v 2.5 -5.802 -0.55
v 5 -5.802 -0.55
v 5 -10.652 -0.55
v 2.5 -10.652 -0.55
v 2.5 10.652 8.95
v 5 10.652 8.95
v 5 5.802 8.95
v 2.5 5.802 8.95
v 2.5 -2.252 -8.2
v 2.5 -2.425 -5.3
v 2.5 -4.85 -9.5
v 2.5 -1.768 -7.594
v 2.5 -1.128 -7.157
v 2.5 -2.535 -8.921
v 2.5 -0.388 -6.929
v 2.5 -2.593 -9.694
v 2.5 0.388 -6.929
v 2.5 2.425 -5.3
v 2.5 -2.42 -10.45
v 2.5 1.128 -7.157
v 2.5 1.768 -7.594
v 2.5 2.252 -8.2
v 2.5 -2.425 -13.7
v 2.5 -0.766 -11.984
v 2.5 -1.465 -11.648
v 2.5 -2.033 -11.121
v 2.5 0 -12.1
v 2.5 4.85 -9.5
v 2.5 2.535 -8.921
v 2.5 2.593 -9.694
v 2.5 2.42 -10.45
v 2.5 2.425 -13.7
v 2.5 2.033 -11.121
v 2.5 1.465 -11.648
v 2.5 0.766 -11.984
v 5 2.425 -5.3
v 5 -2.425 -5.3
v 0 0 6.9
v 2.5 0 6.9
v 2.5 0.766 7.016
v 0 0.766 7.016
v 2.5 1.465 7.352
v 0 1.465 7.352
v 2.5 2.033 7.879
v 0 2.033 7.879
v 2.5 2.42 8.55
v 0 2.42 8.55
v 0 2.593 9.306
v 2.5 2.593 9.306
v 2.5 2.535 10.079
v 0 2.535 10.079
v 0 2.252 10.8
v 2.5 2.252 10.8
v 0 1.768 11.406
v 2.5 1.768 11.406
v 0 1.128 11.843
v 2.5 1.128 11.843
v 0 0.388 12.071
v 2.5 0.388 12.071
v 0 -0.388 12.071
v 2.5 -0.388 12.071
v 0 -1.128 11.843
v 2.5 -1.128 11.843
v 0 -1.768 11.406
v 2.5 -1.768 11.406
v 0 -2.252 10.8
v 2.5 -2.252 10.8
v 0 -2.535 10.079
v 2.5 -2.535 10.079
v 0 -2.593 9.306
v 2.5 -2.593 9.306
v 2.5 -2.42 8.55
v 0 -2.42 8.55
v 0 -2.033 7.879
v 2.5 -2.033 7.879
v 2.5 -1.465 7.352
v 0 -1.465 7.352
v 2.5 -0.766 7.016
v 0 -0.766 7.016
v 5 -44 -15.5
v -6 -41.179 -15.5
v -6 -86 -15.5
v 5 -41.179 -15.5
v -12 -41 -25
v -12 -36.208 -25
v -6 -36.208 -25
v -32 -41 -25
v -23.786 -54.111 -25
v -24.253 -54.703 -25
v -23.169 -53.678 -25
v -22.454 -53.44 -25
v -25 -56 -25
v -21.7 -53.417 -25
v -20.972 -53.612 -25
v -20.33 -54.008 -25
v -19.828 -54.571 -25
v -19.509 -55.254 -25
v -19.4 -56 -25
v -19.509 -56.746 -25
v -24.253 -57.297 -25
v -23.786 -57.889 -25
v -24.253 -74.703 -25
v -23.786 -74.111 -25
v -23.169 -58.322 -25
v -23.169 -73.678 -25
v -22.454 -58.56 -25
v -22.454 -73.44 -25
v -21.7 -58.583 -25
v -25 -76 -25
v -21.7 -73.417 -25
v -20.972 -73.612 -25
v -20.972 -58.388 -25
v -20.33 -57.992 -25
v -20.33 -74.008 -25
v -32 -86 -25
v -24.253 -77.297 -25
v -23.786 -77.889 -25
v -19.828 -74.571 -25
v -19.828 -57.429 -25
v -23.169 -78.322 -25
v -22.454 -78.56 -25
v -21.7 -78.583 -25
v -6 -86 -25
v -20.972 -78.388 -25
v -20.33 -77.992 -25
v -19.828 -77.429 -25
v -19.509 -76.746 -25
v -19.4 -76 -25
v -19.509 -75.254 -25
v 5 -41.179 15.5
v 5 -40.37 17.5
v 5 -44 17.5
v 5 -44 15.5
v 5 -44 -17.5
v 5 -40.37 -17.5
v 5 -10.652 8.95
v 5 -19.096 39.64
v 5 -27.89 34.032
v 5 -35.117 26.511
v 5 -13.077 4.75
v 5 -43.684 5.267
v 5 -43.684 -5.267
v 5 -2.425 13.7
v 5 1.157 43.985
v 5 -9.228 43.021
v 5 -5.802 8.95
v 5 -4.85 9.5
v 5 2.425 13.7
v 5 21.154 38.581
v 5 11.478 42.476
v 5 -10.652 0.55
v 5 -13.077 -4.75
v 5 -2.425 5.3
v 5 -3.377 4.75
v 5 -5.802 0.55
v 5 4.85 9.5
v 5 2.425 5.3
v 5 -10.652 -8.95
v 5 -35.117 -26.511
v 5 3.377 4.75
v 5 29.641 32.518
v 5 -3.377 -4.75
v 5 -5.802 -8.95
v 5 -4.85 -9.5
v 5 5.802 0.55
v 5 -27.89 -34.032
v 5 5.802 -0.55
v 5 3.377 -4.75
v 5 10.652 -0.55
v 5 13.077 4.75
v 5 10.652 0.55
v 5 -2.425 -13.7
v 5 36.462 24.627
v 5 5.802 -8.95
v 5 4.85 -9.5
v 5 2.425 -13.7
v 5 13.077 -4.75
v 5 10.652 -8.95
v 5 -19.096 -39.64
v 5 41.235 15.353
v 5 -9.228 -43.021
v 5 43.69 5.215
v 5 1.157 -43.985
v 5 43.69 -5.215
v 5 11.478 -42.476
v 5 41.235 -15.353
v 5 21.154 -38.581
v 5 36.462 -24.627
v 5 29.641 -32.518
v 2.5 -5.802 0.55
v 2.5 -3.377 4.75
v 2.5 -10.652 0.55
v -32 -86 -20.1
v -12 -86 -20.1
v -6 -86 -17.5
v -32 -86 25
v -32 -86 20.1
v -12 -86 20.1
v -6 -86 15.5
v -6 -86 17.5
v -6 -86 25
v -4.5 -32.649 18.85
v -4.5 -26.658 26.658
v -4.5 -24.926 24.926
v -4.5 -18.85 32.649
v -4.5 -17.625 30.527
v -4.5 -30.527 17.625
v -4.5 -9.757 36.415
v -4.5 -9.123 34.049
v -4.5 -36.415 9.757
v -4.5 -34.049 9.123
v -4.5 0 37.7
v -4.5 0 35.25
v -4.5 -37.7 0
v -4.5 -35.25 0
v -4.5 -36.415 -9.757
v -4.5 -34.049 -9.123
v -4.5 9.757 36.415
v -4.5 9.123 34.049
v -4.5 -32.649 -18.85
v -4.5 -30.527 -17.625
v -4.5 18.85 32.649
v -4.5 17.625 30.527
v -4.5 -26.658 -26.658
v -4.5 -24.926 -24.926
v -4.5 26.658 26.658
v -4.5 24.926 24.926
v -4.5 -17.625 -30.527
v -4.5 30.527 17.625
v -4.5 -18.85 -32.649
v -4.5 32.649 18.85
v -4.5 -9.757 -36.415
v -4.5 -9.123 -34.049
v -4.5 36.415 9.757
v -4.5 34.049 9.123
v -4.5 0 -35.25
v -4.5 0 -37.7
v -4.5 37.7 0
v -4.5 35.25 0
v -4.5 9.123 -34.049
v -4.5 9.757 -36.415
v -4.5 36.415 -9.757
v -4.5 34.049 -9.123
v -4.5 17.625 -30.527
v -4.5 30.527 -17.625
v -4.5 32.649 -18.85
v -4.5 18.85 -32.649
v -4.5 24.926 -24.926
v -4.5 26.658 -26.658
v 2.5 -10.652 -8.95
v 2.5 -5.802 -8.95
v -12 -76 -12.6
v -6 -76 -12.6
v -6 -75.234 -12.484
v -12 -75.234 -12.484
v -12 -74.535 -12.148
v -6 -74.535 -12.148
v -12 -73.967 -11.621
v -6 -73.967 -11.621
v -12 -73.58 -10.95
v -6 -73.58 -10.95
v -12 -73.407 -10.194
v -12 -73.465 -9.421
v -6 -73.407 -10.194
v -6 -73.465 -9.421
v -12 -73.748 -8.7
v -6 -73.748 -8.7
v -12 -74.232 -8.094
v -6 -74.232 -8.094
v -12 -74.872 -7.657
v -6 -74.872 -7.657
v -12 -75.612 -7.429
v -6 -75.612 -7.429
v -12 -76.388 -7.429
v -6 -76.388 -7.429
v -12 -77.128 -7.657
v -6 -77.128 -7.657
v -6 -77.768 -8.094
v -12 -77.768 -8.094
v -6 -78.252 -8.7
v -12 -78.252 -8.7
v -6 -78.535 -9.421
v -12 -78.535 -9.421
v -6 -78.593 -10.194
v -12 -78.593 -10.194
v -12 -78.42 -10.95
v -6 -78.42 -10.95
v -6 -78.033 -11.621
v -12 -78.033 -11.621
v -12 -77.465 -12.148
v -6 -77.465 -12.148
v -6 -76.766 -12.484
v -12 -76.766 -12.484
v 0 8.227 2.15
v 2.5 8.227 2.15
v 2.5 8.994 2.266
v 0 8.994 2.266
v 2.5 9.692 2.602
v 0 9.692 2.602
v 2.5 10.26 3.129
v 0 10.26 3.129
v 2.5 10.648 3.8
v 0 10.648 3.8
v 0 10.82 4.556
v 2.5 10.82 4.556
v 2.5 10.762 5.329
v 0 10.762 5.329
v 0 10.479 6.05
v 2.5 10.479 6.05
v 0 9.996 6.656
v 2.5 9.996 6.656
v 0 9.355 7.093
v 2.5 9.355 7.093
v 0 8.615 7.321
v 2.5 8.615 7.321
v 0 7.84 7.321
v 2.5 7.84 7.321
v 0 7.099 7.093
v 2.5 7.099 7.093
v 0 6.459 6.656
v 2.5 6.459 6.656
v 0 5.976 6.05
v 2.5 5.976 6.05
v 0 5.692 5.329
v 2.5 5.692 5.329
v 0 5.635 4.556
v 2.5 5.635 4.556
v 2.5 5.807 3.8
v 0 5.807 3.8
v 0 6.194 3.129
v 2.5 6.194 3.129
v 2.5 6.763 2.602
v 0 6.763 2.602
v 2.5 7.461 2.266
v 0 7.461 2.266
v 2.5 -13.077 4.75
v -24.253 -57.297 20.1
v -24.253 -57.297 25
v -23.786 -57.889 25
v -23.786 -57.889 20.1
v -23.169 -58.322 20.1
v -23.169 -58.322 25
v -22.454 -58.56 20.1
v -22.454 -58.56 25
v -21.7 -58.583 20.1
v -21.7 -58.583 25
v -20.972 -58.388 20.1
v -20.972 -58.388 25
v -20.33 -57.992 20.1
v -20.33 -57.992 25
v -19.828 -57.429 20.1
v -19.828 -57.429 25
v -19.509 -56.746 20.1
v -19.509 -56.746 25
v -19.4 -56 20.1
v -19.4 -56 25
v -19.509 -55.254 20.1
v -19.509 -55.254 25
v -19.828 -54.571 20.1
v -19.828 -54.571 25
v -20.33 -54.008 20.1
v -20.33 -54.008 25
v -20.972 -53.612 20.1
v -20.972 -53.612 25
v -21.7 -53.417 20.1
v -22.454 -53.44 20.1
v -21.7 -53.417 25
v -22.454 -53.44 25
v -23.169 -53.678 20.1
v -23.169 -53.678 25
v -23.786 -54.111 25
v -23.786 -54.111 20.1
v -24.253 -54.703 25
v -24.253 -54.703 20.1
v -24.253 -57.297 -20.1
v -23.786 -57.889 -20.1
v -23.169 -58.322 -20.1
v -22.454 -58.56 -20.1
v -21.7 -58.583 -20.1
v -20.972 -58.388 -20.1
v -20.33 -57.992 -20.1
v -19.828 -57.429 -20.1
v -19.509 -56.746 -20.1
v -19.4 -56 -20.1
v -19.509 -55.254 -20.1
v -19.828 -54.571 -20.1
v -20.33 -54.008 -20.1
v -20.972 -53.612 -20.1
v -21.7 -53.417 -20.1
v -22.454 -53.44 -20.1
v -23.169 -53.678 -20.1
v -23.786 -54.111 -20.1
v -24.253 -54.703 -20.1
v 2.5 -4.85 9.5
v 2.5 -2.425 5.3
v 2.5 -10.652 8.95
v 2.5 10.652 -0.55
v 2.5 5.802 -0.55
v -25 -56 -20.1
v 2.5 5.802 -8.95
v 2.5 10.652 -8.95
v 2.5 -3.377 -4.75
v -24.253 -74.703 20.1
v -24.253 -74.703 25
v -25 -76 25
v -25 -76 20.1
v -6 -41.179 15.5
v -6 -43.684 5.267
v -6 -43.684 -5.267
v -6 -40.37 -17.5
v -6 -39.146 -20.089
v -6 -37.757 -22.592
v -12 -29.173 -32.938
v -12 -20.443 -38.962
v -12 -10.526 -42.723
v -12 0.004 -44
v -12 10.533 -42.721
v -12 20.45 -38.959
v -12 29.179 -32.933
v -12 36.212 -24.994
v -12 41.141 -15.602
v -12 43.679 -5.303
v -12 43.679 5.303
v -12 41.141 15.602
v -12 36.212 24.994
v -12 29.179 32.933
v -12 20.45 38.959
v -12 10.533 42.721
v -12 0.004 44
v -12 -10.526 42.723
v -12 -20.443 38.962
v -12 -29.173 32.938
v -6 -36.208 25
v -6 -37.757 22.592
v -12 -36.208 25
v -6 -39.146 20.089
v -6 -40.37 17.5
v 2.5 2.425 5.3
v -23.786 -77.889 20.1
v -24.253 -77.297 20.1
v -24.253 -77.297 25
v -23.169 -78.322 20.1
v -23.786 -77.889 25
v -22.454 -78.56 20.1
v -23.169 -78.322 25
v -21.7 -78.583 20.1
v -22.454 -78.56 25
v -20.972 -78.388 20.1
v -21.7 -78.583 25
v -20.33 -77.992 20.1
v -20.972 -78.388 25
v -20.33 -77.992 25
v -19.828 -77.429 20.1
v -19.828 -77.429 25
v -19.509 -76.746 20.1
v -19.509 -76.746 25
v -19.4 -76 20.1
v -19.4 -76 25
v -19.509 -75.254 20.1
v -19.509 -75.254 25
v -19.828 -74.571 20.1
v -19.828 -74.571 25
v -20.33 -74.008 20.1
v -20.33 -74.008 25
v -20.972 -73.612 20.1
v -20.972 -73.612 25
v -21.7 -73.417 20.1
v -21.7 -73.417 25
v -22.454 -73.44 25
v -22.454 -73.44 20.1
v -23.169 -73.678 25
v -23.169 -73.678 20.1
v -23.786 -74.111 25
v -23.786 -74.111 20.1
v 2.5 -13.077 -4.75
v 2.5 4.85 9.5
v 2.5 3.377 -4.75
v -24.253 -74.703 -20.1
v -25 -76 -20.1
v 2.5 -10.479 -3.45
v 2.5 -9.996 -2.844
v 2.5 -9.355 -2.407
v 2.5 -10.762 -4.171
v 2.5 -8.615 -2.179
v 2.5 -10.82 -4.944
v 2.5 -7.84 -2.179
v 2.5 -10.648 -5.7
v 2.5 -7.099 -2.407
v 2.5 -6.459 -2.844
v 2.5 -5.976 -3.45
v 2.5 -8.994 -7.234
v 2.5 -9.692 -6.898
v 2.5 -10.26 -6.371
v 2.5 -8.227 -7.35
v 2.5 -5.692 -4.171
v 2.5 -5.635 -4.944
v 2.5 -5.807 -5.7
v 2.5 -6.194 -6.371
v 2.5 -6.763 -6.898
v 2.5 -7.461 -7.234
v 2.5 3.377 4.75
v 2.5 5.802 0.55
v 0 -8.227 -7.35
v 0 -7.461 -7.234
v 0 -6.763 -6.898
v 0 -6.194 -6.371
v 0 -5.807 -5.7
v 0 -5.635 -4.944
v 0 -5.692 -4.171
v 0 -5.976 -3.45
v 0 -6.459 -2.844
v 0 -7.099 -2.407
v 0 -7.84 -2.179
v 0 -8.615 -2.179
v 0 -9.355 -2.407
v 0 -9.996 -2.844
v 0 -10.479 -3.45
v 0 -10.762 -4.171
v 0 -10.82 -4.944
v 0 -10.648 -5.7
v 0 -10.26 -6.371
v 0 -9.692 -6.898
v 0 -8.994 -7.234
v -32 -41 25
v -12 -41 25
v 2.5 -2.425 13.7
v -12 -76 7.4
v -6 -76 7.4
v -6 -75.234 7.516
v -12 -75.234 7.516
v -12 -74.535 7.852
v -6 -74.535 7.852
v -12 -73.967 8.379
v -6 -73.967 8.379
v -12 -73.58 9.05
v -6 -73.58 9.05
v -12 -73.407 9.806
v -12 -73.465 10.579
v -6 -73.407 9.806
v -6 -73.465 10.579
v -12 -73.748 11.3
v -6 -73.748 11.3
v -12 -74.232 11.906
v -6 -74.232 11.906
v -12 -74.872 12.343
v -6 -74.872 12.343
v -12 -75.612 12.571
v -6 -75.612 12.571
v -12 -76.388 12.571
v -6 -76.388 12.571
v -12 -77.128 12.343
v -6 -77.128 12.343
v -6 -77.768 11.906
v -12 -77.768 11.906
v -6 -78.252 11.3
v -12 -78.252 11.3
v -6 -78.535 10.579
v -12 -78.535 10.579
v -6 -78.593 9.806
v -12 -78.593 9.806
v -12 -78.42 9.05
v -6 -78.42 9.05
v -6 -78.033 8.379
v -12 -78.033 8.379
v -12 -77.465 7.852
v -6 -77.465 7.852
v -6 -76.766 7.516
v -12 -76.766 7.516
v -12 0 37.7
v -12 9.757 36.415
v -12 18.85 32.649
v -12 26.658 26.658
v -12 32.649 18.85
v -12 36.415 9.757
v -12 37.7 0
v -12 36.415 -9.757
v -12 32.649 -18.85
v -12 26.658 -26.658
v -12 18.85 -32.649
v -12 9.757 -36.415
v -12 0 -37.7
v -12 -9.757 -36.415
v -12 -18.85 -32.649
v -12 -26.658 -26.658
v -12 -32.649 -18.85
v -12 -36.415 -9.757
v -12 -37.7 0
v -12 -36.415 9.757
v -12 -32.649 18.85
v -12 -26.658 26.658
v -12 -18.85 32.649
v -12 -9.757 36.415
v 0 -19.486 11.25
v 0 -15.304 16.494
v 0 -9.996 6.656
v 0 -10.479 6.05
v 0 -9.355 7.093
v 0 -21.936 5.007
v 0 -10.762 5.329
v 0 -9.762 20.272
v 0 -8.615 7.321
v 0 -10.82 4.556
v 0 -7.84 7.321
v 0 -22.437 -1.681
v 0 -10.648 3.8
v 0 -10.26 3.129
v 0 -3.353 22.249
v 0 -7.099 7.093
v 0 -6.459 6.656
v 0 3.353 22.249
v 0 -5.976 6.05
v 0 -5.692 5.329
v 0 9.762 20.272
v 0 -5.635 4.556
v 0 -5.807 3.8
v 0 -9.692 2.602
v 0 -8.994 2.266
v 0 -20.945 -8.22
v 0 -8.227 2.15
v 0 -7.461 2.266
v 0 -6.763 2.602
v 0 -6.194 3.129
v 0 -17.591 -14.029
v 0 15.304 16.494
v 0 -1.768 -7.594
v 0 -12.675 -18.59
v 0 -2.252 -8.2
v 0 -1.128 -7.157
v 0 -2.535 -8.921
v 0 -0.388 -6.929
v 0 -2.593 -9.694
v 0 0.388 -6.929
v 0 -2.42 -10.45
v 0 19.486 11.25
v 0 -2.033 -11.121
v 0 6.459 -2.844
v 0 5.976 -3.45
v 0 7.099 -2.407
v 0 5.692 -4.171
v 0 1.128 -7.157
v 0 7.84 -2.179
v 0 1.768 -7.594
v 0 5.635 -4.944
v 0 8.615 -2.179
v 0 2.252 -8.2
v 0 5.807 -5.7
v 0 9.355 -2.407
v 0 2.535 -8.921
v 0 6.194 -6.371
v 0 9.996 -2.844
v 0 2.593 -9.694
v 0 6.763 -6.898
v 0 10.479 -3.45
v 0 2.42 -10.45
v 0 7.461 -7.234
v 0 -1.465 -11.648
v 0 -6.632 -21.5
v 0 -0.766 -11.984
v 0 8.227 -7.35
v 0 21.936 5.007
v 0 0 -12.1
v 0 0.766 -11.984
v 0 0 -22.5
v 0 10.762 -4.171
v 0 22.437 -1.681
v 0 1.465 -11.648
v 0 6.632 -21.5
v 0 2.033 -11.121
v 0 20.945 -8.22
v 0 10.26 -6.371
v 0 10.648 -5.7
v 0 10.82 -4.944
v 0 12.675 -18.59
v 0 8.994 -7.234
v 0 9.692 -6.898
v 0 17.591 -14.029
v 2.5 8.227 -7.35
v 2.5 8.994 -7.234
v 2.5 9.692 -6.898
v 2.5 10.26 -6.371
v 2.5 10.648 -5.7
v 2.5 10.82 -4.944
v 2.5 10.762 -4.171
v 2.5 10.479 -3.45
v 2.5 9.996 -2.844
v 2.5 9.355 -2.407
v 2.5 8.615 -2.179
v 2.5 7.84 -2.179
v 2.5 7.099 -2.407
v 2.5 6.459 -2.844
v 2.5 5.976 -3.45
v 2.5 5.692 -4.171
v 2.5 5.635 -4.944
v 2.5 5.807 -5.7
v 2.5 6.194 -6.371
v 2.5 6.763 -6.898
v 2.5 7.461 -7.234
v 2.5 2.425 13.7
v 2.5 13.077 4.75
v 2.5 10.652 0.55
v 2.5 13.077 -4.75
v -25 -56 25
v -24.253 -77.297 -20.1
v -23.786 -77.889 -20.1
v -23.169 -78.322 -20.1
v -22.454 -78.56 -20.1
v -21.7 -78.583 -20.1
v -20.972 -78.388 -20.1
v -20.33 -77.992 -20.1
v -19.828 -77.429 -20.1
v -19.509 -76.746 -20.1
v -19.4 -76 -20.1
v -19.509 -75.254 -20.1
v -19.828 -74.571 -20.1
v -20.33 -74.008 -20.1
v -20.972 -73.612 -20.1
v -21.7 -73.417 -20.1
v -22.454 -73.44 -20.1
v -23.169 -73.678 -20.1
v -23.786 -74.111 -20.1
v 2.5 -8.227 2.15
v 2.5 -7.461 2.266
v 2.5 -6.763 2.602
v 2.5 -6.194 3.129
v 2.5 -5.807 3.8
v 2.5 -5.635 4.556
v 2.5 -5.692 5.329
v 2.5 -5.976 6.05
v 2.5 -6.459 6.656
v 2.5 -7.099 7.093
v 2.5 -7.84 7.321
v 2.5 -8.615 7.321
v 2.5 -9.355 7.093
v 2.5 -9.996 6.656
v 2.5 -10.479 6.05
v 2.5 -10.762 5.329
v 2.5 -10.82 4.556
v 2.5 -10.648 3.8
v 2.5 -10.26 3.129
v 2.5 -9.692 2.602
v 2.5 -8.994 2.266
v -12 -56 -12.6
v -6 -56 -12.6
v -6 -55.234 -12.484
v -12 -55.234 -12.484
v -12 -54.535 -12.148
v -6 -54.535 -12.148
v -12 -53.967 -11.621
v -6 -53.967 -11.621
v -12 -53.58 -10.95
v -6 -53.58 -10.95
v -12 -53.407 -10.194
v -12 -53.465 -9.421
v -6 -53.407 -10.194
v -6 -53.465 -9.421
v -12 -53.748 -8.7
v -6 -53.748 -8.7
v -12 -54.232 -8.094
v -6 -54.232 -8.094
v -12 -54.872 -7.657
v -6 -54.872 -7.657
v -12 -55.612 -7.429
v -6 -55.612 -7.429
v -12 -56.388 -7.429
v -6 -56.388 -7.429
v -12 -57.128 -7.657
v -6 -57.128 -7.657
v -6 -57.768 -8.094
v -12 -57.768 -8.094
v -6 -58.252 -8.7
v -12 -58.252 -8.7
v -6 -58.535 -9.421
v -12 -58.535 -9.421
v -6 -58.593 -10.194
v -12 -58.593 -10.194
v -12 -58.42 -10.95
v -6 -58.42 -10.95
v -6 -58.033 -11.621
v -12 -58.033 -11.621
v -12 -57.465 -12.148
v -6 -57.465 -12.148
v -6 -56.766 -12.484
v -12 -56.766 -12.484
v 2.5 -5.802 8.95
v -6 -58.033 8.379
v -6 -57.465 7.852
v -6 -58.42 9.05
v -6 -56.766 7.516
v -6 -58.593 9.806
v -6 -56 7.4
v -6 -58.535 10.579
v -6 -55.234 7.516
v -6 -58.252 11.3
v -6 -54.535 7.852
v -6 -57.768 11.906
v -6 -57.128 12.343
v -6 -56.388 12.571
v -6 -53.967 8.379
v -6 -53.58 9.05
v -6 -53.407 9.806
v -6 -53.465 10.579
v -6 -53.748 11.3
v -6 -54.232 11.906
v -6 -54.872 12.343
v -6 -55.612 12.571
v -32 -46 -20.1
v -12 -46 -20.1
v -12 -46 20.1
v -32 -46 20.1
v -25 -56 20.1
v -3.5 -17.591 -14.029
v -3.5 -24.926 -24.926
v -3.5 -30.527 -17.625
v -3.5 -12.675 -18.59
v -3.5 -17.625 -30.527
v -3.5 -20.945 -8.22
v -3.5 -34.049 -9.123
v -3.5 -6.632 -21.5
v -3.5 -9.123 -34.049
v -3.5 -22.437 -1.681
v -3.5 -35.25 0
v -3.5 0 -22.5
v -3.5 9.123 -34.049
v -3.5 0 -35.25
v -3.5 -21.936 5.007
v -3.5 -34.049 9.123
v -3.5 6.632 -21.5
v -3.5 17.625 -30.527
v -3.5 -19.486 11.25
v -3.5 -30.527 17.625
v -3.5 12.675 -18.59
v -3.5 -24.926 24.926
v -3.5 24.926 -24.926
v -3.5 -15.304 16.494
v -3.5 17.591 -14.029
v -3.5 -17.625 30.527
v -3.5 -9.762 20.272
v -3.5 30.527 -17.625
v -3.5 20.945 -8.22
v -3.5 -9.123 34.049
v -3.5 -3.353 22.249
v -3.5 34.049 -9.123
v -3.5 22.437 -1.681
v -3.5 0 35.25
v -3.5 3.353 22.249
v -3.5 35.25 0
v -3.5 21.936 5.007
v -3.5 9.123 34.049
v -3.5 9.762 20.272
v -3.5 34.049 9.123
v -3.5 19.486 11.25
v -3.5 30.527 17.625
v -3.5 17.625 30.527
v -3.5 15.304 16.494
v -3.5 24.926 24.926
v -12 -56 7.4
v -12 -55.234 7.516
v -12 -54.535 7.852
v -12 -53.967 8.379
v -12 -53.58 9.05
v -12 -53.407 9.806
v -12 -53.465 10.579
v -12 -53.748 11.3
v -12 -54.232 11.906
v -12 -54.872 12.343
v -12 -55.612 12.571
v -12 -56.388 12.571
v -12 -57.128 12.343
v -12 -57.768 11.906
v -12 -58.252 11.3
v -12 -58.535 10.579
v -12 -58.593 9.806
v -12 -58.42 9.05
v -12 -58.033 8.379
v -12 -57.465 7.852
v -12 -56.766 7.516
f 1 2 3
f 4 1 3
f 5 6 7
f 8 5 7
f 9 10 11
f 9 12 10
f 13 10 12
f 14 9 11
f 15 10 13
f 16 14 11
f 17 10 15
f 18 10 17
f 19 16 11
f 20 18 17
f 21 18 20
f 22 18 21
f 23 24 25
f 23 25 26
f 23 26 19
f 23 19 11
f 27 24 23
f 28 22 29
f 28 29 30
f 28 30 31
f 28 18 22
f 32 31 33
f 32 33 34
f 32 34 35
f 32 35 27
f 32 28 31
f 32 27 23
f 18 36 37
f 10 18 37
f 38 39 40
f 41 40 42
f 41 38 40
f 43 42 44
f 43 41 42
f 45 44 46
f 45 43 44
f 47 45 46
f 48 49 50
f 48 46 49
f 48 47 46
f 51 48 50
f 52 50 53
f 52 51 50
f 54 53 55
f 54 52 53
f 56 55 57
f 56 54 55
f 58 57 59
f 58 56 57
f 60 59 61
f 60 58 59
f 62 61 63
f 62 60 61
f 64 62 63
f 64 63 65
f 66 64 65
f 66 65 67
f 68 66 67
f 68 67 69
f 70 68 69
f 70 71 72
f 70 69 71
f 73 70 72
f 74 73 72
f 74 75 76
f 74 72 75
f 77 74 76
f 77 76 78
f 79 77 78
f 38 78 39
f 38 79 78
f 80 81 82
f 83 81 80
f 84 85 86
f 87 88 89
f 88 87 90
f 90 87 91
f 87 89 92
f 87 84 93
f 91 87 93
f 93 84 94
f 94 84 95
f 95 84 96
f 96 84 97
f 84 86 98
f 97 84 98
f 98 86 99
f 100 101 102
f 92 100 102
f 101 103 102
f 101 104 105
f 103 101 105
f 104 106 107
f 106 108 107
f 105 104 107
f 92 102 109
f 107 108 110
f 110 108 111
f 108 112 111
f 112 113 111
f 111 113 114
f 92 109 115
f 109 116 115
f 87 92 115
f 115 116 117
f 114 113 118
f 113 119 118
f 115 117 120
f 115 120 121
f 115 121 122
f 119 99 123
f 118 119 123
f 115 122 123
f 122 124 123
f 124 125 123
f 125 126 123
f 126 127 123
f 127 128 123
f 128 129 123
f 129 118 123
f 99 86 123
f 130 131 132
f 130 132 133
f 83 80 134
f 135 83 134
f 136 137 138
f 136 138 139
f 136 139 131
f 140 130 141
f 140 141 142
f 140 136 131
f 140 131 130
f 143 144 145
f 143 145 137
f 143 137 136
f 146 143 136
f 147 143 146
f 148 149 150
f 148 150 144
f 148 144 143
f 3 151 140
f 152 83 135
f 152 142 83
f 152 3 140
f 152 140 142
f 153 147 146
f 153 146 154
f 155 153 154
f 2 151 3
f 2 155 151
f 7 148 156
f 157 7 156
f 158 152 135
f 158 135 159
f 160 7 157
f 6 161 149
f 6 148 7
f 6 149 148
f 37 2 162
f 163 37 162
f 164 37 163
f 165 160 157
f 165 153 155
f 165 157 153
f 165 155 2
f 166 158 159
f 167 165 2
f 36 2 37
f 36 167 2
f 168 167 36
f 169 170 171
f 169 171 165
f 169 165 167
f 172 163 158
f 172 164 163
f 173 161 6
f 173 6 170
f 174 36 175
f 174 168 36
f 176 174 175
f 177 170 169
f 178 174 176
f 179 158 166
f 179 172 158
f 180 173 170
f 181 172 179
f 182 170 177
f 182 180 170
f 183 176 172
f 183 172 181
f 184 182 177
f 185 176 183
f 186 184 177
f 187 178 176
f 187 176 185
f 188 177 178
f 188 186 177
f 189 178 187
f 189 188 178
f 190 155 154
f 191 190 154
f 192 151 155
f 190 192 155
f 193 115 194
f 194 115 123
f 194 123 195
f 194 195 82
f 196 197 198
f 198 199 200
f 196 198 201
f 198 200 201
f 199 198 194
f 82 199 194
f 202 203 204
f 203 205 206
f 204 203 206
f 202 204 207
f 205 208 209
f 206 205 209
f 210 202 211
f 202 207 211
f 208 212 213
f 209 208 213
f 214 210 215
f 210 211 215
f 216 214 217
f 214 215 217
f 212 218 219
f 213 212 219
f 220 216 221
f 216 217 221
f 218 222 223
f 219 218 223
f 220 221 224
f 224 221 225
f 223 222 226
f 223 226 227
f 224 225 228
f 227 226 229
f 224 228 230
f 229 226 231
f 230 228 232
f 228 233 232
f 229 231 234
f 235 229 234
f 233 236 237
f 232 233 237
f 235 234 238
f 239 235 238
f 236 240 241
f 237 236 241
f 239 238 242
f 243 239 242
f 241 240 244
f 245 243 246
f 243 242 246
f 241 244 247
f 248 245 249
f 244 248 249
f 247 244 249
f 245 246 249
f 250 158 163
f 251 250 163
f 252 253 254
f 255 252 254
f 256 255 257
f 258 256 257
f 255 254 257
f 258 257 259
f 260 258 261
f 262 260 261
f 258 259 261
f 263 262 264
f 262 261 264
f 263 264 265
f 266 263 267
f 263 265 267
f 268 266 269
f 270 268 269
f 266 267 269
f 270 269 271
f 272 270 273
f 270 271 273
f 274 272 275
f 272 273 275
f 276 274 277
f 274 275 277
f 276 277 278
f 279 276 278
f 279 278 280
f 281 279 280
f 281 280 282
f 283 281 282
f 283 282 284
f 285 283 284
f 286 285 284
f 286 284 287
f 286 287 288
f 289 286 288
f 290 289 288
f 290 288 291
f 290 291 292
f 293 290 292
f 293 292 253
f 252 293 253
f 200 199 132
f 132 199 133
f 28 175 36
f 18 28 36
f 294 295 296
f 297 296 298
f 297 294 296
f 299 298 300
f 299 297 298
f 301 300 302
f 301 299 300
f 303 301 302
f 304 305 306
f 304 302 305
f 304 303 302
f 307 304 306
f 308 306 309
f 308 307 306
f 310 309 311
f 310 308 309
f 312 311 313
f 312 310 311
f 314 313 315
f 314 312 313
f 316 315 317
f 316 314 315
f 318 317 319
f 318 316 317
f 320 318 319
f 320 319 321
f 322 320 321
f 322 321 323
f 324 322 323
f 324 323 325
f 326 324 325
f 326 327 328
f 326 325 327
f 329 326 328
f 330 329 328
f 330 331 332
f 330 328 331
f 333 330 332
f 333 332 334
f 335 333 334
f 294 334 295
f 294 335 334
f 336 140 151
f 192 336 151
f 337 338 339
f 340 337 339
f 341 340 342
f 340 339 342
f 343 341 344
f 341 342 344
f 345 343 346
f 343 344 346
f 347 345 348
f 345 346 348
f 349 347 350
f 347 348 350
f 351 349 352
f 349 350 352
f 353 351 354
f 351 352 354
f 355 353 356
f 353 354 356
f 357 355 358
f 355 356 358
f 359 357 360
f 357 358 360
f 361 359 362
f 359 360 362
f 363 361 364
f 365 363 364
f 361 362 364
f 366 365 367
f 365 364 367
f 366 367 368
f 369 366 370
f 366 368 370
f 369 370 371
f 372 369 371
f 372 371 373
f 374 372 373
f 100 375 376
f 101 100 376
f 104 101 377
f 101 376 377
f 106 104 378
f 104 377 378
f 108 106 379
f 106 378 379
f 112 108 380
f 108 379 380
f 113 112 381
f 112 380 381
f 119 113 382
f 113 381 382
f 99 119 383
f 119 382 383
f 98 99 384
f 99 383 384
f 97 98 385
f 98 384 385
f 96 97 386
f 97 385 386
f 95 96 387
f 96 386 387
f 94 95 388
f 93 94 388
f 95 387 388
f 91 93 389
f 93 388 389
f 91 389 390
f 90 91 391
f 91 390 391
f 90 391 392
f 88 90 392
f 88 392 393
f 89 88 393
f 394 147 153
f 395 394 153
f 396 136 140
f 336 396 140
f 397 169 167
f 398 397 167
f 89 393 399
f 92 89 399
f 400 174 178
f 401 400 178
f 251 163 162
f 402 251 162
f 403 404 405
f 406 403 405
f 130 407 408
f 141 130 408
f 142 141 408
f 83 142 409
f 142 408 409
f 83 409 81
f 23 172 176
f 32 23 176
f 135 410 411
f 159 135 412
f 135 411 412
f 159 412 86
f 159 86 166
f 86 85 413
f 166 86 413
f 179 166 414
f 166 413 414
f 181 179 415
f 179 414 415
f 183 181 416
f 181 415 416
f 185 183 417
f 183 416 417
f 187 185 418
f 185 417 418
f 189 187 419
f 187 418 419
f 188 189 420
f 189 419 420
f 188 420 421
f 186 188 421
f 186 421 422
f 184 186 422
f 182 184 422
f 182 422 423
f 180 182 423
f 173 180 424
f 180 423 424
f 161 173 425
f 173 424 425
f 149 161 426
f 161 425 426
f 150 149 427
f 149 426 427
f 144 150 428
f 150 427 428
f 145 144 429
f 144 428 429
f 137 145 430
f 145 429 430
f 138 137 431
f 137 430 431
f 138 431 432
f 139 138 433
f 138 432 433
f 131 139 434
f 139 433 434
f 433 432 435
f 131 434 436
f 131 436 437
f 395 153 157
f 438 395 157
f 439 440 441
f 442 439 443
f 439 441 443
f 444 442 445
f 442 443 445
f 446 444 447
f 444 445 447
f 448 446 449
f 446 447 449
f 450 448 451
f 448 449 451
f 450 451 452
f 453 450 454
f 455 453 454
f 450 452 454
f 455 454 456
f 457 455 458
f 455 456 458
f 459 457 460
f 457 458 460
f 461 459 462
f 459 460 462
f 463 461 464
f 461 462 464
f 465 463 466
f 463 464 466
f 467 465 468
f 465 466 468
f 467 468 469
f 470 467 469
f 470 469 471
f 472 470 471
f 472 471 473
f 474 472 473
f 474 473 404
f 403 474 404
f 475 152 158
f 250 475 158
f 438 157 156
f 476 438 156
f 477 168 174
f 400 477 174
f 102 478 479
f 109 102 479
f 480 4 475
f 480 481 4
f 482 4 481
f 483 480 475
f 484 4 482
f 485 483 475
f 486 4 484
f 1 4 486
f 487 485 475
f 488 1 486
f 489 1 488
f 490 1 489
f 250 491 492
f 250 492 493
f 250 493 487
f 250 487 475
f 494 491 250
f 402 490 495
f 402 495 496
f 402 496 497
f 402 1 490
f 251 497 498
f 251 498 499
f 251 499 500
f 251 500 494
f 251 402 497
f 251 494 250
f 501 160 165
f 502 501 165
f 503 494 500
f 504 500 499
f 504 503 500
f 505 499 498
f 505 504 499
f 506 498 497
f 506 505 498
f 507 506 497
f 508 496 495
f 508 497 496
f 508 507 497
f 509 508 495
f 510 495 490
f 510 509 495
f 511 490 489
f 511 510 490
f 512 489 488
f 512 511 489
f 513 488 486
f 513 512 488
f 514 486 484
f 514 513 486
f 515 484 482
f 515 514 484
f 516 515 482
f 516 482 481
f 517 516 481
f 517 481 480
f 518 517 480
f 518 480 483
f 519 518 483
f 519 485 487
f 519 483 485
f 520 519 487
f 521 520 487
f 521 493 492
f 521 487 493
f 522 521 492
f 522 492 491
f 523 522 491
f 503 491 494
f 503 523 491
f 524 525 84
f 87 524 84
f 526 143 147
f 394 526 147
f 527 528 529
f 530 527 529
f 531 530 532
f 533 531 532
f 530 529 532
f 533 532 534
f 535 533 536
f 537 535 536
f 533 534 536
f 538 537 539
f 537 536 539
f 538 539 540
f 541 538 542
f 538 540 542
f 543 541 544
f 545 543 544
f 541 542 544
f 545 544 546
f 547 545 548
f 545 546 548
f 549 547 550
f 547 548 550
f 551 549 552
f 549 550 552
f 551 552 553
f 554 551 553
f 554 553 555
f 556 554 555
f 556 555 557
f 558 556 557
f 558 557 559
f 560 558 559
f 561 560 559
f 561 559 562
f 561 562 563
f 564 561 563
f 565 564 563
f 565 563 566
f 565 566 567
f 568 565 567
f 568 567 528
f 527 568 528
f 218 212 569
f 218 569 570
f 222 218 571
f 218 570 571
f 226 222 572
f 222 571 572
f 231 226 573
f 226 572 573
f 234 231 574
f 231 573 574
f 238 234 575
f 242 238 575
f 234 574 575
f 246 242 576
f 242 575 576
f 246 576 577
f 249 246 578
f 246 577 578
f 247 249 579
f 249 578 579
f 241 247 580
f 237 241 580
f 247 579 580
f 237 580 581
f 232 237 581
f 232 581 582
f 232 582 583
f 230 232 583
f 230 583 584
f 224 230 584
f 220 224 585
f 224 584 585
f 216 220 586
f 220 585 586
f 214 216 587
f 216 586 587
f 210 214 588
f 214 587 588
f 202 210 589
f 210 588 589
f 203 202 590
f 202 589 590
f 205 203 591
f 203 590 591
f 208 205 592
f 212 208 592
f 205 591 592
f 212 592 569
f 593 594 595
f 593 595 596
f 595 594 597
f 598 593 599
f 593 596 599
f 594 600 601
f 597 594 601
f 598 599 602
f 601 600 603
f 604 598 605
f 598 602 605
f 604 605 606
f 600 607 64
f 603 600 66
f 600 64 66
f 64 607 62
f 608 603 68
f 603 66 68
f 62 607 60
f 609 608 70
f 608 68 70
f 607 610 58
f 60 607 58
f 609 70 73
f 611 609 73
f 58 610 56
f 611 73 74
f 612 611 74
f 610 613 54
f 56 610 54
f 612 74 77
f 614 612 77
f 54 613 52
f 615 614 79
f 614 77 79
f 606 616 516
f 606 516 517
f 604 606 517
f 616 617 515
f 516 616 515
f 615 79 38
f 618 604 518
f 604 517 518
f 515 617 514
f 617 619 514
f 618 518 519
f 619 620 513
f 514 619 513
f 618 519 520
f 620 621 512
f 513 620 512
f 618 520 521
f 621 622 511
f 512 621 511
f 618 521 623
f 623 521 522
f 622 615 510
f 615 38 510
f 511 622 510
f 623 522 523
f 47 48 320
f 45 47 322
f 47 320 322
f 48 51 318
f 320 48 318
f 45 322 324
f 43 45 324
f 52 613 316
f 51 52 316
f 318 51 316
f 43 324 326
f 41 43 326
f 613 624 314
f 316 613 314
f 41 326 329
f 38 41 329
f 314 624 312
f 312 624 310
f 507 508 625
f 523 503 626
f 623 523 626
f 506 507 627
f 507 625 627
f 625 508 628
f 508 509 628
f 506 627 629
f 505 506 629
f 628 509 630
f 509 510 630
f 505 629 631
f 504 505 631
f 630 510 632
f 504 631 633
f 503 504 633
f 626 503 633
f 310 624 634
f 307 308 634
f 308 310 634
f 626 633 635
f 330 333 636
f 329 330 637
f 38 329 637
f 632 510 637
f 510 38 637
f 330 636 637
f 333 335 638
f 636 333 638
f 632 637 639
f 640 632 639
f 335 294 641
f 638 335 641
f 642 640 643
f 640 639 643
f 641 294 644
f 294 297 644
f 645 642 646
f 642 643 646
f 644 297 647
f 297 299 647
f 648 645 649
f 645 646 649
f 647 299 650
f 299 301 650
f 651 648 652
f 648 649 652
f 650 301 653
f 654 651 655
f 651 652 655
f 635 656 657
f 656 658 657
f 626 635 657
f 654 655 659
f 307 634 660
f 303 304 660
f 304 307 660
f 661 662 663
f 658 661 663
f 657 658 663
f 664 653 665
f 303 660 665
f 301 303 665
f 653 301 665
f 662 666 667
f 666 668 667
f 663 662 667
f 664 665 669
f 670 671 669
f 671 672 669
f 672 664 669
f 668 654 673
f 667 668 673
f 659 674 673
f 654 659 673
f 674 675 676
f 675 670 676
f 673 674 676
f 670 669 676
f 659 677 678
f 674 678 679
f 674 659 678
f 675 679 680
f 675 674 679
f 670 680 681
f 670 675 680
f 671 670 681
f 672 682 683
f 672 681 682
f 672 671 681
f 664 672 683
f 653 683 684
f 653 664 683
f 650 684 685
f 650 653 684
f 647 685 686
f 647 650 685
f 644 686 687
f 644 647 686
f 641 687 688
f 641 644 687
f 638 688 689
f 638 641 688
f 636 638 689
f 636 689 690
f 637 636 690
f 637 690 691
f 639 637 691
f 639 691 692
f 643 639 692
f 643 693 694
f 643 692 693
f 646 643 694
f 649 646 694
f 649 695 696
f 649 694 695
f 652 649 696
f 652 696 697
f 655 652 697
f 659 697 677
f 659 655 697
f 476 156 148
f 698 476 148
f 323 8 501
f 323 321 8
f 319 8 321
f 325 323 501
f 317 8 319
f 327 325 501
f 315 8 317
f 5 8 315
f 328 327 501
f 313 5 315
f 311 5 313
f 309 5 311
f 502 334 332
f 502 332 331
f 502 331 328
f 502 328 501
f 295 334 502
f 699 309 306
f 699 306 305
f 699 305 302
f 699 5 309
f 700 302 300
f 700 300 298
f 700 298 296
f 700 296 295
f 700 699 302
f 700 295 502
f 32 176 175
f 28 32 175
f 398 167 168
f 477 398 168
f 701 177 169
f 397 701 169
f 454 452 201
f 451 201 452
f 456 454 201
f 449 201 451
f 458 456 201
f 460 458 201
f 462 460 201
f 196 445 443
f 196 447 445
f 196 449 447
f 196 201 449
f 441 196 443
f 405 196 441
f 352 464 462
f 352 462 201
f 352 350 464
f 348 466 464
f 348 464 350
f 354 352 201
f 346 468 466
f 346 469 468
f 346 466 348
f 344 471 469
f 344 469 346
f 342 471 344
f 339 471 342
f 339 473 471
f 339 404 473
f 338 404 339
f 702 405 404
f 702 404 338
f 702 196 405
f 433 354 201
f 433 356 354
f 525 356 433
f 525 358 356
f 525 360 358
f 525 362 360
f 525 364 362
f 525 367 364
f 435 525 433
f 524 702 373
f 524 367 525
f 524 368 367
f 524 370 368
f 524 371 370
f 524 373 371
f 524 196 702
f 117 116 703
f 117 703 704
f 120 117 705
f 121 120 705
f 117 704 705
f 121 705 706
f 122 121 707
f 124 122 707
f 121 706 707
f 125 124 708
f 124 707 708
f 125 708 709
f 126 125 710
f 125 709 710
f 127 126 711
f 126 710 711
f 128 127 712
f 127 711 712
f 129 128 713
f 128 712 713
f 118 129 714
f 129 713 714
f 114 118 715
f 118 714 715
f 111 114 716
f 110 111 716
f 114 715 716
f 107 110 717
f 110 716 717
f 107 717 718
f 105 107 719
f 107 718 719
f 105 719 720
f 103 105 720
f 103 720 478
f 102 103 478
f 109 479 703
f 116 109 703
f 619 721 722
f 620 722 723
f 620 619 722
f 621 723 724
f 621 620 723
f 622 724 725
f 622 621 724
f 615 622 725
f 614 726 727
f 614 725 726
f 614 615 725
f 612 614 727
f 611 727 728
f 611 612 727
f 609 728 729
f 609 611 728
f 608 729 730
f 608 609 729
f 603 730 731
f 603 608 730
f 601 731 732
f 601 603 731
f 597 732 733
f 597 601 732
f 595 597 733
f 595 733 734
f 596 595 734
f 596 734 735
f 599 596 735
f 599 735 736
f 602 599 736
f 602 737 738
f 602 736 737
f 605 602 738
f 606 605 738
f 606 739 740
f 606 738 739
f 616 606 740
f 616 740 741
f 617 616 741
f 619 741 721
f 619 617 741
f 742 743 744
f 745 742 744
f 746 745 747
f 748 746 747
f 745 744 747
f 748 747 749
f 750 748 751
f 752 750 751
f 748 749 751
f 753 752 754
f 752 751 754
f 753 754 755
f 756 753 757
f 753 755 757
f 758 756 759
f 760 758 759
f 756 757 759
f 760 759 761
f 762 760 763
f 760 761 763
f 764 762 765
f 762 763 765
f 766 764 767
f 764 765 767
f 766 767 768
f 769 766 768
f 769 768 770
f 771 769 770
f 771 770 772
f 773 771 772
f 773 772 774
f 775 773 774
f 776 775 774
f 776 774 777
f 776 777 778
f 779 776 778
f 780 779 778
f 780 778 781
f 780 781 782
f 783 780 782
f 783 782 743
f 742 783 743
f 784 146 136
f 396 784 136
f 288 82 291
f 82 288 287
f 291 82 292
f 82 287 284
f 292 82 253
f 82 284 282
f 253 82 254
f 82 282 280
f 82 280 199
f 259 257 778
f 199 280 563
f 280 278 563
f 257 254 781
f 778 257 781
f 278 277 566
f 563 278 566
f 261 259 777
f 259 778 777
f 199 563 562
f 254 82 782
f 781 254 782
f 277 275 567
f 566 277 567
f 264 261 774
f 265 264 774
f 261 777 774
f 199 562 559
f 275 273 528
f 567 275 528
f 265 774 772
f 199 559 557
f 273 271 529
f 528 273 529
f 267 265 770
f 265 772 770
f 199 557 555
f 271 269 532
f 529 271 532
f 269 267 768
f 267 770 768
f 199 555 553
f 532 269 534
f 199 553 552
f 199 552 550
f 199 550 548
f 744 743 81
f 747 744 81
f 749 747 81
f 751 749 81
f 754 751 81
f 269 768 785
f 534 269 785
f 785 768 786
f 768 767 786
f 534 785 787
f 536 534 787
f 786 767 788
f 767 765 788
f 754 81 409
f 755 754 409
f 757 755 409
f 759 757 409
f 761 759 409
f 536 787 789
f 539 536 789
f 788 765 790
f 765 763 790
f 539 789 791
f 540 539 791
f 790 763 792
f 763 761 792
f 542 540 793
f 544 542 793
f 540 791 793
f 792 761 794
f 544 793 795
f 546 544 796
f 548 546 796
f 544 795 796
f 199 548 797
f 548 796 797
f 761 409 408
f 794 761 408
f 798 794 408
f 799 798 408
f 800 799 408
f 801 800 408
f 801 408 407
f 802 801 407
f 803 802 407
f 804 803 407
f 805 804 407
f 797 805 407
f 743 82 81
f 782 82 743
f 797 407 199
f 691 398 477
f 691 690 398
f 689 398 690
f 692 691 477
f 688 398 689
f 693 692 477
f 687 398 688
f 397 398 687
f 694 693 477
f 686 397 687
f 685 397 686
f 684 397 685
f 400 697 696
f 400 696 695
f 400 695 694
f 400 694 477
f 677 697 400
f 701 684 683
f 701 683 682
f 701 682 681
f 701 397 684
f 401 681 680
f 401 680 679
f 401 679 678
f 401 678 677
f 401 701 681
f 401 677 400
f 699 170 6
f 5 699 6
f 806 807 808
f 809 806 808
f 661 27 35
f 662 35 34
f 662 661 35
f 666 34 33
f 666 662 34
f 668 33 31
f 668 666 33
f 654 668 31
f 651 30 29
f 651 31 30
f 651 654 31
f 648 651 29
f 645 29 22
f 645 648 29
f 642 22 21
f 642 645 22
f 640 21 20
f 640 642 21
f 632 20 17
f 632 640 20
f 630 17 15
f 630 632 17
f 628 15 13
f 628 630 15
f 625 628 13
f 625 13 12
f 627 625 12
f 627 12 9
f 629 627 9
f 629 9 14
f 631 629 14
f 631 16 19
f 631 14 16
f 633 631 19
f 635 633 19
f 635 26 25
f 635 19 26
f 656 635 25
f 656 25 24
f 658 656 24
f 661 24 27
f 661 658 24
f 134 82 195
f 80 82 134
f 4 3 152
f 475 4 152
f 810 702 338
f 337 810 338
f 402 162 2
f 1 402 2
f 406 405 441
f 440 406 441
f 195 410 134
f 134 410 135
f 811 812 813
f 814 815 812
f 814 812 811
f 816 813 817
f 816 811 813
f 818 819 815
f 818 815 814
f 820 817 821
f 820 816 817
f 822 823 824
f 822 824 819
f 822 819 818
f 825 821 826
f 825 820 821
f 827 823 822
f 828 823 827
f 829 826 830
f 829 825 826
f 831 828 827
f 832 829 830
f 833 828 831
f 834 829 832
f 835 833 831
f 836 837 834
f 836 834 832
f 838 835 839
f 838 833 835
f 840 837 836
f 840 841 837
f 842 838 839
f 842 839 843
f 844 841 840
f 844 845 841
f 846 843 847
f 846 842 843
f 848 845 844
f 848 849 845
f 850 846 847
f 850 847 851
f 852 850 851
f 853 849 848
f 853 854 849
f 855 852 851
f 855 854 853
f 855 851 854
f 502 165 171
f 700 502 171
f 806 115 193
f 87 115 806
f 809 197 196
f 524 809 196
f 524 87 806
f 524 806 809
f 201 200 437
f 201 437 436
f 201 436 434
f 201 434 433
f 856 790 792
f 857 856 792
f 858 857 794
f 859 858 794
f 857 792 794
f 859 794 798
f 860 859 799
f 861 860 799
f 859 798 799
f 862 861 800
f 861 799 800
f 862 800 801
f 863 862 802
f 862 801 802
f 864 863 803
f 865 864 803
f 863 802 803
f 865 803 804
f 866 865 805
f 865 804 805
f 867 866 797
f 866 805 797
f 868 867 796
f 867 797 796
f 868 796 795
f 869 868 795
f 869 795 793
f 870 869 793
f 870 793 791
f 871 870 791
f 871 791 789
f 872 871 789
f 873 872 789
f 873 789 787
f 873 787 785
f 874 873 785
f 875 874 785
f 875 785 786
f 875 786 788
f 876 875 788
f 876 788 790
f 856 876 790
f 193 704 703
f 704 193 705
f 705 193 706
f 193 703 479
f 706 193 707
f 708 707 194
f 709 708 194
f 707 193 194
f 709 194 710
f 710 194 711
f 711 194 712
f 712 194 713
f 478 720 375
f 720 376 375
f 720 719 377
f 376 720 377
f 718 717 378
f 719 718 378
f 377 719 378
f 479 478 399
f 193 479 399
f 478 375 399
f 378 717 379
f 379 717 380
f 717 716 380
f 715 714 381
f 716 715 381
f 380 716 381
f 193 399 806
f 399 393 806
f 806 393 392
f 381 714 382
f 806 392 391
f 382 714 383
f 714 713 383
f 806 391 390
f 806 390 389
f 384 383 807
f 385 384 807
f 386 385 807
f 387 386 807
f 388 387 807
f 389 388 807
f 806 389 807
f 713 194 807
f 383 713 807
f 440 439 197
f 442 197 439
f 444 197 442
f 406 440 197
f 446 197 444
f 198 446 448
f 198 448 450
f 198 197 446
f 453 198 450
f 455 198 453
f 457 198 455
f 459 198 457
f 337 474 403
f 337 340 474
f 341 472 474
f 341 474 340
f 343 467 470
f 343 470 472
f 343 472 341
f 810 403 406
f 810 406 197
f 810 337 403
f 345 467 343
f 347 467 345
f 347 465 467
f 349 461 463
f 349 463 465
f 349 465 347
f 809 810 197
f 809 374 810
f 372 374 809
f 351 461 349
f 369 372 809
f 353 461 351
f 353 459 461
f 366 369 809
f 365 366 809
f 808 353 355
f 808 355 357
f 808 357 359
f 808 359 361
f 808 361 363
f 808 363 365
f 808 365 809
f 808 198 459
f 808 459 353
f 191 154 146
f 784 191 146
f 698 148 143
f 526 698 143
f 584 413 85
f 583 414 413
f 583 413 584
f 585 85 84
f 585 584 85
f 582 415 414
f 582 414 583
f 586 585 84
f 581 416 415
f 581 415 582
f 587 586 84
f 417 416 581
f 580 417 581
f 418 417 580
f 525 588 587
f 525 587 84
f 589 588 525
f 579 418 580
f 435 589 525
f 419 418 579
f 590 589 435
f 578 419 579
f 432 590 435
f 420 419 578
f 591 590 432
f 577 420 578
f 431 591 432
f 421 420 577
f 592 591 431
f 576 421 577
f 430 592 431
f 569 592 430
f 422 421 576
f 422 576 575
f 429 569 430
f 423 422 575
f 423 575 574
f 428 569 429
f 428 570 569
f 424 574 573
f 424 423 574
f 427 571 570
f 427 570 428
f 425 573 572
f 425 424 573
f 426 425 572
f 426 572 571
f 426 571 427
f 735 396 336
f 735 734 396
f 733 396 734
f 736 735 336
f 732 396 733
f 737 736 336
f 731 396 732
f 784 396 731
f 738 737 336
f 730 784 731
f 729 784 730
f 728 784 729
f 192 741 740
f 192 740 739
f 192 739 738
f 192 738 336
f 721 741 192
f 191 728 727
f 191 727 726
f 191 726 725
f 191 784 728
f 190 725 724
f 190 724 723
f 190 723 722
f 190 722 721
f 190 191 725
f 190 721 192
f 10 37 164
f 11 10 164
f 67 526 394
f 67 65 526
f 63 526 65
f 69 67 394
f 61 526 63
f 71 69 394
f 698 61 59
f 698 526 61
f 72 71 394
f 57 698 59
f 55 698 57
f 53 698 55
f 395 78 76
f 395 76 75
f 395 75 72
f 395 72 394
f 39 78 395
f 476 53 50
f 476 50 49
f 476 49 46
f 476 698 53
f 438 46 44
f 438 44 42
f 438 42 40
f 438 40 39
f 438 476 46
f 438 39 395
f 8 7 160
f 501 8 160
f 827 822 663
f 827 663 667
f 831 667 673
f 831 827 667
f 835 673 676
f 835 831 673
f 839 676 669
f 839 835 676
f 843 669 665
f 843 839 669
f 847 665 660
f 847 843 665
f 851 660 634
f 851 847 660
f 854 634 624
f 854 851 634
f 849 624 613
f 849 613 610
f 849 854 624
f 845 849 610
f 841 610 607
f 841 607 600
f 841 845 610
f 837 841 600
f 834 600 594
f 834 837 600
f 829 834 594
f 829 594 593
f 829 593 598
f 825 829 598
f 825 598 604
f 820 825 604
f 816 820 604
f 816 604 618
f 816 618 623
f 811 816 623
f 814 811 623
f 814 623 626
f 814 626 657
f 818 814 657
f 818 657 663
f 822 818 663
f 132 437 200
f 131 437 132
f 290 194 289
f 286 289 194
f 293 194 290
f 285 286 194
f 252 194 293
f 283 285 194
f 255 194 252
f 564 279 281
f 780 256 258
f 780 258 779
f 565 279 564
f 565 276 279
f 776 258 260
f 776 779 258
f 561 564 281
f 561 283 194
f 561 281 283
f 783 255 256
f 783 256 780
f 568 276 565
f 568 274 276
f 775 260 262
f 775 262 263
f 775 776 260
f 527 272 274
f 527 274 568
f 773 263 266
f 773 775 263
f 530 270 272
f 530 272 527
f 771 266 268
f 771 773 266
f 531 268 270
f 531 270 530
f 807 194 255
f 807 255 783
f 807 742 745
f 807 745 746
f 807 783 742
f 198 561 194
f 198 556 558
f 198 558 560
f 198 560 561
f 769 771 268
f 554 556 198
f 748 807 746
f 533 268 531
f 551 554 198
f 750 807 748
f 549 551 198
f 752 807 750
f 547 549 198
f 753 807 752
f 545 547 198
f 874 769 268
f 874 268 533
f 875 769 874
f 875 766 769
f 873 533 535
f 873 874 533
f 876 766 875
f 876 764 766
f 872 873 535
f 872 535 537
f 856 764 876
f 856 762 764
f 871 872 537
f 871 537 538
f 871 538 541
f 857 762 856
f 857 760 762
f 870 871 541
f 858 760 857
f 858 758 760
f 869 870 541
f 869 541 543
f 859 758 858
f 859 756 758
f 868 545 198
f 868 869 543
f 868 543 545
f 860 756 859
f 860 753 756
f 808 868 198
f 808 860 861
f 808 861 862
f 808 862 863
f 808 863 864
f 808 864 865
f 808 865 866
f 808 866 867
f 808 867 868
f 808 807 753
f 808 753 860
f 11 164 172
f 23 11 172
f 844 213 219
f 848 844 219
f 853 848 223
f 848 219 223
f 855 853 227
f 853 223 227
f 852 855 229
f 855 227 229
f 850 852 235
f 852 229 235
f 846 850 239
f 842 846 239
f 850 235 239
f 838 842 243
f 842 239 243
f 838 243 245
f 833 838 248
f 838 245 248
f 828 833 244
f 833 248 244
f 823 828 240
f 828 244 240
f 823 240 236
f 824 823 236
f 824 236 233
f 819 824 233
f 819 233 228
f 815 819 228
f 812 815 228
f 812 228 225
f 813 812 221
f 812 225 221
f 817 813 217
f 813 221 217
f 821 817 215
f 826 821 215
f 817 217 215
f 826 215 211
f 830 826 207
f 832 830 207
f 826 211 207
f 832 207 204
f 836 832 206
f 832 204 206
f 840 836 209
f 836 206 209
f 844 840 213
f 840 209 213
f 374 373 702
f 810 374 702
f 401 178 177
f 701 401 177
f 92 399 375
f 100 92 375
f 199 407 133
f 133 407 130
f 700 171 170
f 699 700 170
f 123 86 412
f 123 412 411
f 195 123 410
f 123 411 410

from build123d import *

# Parameters (mm, degrees)
SKETCH1_R                = 44
SKETCH1_R_2              = 2.6
BOSS_EXTRUDE1_DEPTH      = 5
BOSS_EXTRUDE2_START      = -4.5
SKETCH1_3_R              = 44
SKETCH1_3_R_2            = 22.5
BOSS_EXTRUDE2_DEPTH      = 4.5
BOSS_EXTRUDE3_START      = 7.5
SKETCH2_R                = 44
SKETCH2_R_2              = 37.7
BOSS_EXTRUDE3_DEPTH      = 7.5
BOSS_EXTRUDE4_DEPTH      = 6
SKETCH4_R                = 35.25
CUT_EXTRUDE1_DEPTH       = 1
BOSS_EXTRUDE5_DEPTH      = 20
BOSS_EXTRUDE7_DEPTH      = 1
BOSS_EXTRUDE7_DEPTH_BACK = 1
BOSS_EXTRUDE8_DEPTH      = 1
BOSS_EXTRUDE8_DEPTH_BACK = 1
SKETCH8_R                = 2.6
CUT_EXTRUDE2_DEPTH       = 101.039992003
CUT_EXTRUDE3_DEPTH       = 115.808536268
CUT_EXTRUDE4_DEPTH       = 2.5


with BuildPart() as part:
    # Sketch1 → Boss-Extrude1 (new body)
    with BuildSketch(Plane(origin=(0, 0, 0), x_dir=(0, 0, -1), z_dir=(1, 0, 0))):
        Circle(SKETCH1_R)
        with Locations((-4.75, -8.227241336)):
            Circle(SKETCH1_R_2, mode=Mode.SUBTRACT)
        with Locations((4.75, -8.227241336)):
            Circle(SKETCH1_R_2, mode=Mode.SUBTRACT)
        with Locations((9.5, 0)):
            Circle(SKETCH1_R_2, mode=Mode.SUBTRACT)
        with Locations((-9.5, 0)):
            Circle(SKETCH1_R_2, mode=Mode.SUBTRACT)
        with Locations((-4.75, 8.227241336)):
            Circle(SKETCH1_R_2, mode=Mode.SUBTRACT)
        with Locations((4.75, 8.227241336)):
            Circle(SKETCH1_R_2, mode=Mode.SUBTRACT)
    extrude(amount=BOSS_EXTRUDE1_DEPTH)

    # Sketch1<3> → Boss-Extrude2 (add)
    with BuildSketch(Plane(origin=(0, 0, 0), x_dir=(0, 0, -1), z_dir=(1, 0, 0)).offset(BOSS_EXTRUDE2_START)):
        Circle(SKETCH1_3_R)
        Circle(SKETCH1_3_R_2, mode=Mode.SUBTRACT)
    extrude(amount=BOSS_EXTRUDE2_DEPTH)

    # Sketch2 → Boss-Extrude3 (add)
    with BuildSketch(Plane.ZY.offset(4.5).offset(BOSS_EXTRUDE3_START)):
        Circle(SKETCH2_R)
        Circle(SKETCH2_R_2, mode=Mode.SUBTRACT)
    extrude(amount=-BOSS_EXTRUDE3_DEPTH)

    # Sketch3 → Boss-Extrude4 (add)
    with BuildSketch(Plane.ZY.offset(12)):
        with BuildLine():
            Line((-25, -86), (25, -86))
            Line((25, -86), (25, -36.20773398))
            ThreePointArc((25, -36.20773398), (0, -44), (-25, -36.20773398))
            Line((-25, -36.20773398), (-25, -86))
        make_face()
    extrude(amount=-BOSS_EXTRUDE4_DEPTH)

    # Sketch4 → Cut-Extrude1 (cut)
    with BuildSketch(Plane.ZY.offset(4.5)):
        Circle(SKETCH4_R)
    extrude(amount=-CUT_EXTRUDE1_DEPTH, mode=Mode.SUBTRACT)

    # Sketch5 → Boss-Extrude5 (add)
    with BuildSketch(Plane.ZY.offset(12)):
        Polygon((-25, -41), (-25, -86), (-20.1, -86), (-20.1, -46), (20.1, -46), (20.1, -86), (25, -86), (25, -41), align=None)
    extrude(amount=BOSS_EXTRUDE5_DEPTH)

    # Sketch6 → Boss-Extrude7 (add, two sides: drawn at the far end of the back side and taken through both)
    with BuildSketch(Plane.XY.offset(16.5).offset(-BOSS_EXTRUDE7_DEPTH_BACK)):
        Polygon((5, -40), (-6, -40), (-6, -86), (5, -44), align=None)
    extrude(amount=BOSS_EXTRUDE7_DEPTH + BOSS_EXTRUDE7_DEPTH_BACK)

    # Sketch7 → Boss-Extrude8 (add, two sides: drawn at the far end of the back side and taken through both)
    with BuildSketch(Plane(origin=(0, 0, -16.5), x_dir=(-1, 0, 0), z_dir=(0, 0, -1)).offset(-BOSS_EXTRUDE8_DEPTH_BACK)):
        Polygon((-5, -40), (6, -40), (6, -86), (-5, -44), align=None)
    extrude(amount=BOSS_EXTRUDE8_DEPTH + BOSS_EXTRUDE8_DEPTH_BACK)

    # Sketch8 → Cut-Extrude2 (cut, through all)
    with BuildSketch(Plane(origin=(-6, 0, 0), x_dir=(0, 0, -1), z_dir=(1, 0, 0))):
        with Locations((-10, -76)):
            Circle(SKETCH8_R)
        with Locations((10, -76)):
            Circle(SKETCH8_R)
        with Locations((-10, -56)):
            Circle(SKETCH8_R)
        with Locations((10, -56)):
            Circle(SKETCH8_R)
    extrude(amount=-CUT_EXTRUDE2_DEPTH, mode=Mode.SUBTRACT)

    # Sketch9 → Cut-Extrude3 (cut, through all)
    with BuildSketch(Plane.XY.offset(25)):
        with BuildLine():
            Line((-25, -56), (-24.253333333, -57.297107894))
            ThreePointArc((-24.253333333, -57.297107894), (-19.4, -56), (-24.253333333, -54.702892106))
            Line((-24.253333333, -54.702892106), (-25, -56))
        make_face()
        with BuildLine():
            Line((-25, -76), (-24.253333333, -77.297107894))
            ThreePointArc((-24.253333333, -77.297107894), (-19.4, -76), (-24.253333333, -74.702892106))
            Line((-24.253333333, -74.702892106), (-25, -76))
        make_face()
    extrude(amount=-CUT_EXTRUDE3_DEPTH, mode=Mode.SUBTRACT)

    # Sketch10 → Cut-Extrude4 (cut)
    with BuildSketch(Plane(origin=(5, 0, 0), x_dir=(0, 0, -1), z_dir=(1, 0, 0))):
        Polygon((9.5, -4.849742261), (13.7, -2.424871131), (13.7, 2.424871131), (9.5, 4.849742261), (5.3, 2.424871131), (5.3, -2.424871131), align=None)
        Polygon((8.95, 5.802370205), (8.95, 10.652112467), (4.75, 13.076983597), (0.55, 10.652112467), (0.55, 5.802370205), (4.75, 3.377499075), align=None)
        Polygon((0.55, -10.652112467), (4.75, -13.076983597), (8.95, -10.652112467), (8.95, -5.802370205), (4.75, -3.377499075), (0.55, -5.802370205), align=None)
        Polygon((-8.95, -5.802370205), (-8.95, -10.652112467), (-4.75, -13.076983597), (-0.55, -10.652112467), (-0.55, -5.802370205), (-4.75, -3.377499075), align=None)
        Polygon((-9.5, 4.849742261), (-13.7, 2.424871131), (-13.7, -2.424871131), (-9.5, -4.849742261), (-5.3, -2.424871131), (-5.3, 2.424871131), align=None)
        Polygon((-0.55, 10.652112467), (-4.75, 13.076983597), (-8.95, 10.652112467), (-8.95, 5.802370205), (-4.75, 3.377499075), (-0.55, 5.802370205), align=None)
    extrude(amount=-CUT_EXTRUDE4_DEPTH, mode=Mode.SUBTRACT)


solid = part.part
